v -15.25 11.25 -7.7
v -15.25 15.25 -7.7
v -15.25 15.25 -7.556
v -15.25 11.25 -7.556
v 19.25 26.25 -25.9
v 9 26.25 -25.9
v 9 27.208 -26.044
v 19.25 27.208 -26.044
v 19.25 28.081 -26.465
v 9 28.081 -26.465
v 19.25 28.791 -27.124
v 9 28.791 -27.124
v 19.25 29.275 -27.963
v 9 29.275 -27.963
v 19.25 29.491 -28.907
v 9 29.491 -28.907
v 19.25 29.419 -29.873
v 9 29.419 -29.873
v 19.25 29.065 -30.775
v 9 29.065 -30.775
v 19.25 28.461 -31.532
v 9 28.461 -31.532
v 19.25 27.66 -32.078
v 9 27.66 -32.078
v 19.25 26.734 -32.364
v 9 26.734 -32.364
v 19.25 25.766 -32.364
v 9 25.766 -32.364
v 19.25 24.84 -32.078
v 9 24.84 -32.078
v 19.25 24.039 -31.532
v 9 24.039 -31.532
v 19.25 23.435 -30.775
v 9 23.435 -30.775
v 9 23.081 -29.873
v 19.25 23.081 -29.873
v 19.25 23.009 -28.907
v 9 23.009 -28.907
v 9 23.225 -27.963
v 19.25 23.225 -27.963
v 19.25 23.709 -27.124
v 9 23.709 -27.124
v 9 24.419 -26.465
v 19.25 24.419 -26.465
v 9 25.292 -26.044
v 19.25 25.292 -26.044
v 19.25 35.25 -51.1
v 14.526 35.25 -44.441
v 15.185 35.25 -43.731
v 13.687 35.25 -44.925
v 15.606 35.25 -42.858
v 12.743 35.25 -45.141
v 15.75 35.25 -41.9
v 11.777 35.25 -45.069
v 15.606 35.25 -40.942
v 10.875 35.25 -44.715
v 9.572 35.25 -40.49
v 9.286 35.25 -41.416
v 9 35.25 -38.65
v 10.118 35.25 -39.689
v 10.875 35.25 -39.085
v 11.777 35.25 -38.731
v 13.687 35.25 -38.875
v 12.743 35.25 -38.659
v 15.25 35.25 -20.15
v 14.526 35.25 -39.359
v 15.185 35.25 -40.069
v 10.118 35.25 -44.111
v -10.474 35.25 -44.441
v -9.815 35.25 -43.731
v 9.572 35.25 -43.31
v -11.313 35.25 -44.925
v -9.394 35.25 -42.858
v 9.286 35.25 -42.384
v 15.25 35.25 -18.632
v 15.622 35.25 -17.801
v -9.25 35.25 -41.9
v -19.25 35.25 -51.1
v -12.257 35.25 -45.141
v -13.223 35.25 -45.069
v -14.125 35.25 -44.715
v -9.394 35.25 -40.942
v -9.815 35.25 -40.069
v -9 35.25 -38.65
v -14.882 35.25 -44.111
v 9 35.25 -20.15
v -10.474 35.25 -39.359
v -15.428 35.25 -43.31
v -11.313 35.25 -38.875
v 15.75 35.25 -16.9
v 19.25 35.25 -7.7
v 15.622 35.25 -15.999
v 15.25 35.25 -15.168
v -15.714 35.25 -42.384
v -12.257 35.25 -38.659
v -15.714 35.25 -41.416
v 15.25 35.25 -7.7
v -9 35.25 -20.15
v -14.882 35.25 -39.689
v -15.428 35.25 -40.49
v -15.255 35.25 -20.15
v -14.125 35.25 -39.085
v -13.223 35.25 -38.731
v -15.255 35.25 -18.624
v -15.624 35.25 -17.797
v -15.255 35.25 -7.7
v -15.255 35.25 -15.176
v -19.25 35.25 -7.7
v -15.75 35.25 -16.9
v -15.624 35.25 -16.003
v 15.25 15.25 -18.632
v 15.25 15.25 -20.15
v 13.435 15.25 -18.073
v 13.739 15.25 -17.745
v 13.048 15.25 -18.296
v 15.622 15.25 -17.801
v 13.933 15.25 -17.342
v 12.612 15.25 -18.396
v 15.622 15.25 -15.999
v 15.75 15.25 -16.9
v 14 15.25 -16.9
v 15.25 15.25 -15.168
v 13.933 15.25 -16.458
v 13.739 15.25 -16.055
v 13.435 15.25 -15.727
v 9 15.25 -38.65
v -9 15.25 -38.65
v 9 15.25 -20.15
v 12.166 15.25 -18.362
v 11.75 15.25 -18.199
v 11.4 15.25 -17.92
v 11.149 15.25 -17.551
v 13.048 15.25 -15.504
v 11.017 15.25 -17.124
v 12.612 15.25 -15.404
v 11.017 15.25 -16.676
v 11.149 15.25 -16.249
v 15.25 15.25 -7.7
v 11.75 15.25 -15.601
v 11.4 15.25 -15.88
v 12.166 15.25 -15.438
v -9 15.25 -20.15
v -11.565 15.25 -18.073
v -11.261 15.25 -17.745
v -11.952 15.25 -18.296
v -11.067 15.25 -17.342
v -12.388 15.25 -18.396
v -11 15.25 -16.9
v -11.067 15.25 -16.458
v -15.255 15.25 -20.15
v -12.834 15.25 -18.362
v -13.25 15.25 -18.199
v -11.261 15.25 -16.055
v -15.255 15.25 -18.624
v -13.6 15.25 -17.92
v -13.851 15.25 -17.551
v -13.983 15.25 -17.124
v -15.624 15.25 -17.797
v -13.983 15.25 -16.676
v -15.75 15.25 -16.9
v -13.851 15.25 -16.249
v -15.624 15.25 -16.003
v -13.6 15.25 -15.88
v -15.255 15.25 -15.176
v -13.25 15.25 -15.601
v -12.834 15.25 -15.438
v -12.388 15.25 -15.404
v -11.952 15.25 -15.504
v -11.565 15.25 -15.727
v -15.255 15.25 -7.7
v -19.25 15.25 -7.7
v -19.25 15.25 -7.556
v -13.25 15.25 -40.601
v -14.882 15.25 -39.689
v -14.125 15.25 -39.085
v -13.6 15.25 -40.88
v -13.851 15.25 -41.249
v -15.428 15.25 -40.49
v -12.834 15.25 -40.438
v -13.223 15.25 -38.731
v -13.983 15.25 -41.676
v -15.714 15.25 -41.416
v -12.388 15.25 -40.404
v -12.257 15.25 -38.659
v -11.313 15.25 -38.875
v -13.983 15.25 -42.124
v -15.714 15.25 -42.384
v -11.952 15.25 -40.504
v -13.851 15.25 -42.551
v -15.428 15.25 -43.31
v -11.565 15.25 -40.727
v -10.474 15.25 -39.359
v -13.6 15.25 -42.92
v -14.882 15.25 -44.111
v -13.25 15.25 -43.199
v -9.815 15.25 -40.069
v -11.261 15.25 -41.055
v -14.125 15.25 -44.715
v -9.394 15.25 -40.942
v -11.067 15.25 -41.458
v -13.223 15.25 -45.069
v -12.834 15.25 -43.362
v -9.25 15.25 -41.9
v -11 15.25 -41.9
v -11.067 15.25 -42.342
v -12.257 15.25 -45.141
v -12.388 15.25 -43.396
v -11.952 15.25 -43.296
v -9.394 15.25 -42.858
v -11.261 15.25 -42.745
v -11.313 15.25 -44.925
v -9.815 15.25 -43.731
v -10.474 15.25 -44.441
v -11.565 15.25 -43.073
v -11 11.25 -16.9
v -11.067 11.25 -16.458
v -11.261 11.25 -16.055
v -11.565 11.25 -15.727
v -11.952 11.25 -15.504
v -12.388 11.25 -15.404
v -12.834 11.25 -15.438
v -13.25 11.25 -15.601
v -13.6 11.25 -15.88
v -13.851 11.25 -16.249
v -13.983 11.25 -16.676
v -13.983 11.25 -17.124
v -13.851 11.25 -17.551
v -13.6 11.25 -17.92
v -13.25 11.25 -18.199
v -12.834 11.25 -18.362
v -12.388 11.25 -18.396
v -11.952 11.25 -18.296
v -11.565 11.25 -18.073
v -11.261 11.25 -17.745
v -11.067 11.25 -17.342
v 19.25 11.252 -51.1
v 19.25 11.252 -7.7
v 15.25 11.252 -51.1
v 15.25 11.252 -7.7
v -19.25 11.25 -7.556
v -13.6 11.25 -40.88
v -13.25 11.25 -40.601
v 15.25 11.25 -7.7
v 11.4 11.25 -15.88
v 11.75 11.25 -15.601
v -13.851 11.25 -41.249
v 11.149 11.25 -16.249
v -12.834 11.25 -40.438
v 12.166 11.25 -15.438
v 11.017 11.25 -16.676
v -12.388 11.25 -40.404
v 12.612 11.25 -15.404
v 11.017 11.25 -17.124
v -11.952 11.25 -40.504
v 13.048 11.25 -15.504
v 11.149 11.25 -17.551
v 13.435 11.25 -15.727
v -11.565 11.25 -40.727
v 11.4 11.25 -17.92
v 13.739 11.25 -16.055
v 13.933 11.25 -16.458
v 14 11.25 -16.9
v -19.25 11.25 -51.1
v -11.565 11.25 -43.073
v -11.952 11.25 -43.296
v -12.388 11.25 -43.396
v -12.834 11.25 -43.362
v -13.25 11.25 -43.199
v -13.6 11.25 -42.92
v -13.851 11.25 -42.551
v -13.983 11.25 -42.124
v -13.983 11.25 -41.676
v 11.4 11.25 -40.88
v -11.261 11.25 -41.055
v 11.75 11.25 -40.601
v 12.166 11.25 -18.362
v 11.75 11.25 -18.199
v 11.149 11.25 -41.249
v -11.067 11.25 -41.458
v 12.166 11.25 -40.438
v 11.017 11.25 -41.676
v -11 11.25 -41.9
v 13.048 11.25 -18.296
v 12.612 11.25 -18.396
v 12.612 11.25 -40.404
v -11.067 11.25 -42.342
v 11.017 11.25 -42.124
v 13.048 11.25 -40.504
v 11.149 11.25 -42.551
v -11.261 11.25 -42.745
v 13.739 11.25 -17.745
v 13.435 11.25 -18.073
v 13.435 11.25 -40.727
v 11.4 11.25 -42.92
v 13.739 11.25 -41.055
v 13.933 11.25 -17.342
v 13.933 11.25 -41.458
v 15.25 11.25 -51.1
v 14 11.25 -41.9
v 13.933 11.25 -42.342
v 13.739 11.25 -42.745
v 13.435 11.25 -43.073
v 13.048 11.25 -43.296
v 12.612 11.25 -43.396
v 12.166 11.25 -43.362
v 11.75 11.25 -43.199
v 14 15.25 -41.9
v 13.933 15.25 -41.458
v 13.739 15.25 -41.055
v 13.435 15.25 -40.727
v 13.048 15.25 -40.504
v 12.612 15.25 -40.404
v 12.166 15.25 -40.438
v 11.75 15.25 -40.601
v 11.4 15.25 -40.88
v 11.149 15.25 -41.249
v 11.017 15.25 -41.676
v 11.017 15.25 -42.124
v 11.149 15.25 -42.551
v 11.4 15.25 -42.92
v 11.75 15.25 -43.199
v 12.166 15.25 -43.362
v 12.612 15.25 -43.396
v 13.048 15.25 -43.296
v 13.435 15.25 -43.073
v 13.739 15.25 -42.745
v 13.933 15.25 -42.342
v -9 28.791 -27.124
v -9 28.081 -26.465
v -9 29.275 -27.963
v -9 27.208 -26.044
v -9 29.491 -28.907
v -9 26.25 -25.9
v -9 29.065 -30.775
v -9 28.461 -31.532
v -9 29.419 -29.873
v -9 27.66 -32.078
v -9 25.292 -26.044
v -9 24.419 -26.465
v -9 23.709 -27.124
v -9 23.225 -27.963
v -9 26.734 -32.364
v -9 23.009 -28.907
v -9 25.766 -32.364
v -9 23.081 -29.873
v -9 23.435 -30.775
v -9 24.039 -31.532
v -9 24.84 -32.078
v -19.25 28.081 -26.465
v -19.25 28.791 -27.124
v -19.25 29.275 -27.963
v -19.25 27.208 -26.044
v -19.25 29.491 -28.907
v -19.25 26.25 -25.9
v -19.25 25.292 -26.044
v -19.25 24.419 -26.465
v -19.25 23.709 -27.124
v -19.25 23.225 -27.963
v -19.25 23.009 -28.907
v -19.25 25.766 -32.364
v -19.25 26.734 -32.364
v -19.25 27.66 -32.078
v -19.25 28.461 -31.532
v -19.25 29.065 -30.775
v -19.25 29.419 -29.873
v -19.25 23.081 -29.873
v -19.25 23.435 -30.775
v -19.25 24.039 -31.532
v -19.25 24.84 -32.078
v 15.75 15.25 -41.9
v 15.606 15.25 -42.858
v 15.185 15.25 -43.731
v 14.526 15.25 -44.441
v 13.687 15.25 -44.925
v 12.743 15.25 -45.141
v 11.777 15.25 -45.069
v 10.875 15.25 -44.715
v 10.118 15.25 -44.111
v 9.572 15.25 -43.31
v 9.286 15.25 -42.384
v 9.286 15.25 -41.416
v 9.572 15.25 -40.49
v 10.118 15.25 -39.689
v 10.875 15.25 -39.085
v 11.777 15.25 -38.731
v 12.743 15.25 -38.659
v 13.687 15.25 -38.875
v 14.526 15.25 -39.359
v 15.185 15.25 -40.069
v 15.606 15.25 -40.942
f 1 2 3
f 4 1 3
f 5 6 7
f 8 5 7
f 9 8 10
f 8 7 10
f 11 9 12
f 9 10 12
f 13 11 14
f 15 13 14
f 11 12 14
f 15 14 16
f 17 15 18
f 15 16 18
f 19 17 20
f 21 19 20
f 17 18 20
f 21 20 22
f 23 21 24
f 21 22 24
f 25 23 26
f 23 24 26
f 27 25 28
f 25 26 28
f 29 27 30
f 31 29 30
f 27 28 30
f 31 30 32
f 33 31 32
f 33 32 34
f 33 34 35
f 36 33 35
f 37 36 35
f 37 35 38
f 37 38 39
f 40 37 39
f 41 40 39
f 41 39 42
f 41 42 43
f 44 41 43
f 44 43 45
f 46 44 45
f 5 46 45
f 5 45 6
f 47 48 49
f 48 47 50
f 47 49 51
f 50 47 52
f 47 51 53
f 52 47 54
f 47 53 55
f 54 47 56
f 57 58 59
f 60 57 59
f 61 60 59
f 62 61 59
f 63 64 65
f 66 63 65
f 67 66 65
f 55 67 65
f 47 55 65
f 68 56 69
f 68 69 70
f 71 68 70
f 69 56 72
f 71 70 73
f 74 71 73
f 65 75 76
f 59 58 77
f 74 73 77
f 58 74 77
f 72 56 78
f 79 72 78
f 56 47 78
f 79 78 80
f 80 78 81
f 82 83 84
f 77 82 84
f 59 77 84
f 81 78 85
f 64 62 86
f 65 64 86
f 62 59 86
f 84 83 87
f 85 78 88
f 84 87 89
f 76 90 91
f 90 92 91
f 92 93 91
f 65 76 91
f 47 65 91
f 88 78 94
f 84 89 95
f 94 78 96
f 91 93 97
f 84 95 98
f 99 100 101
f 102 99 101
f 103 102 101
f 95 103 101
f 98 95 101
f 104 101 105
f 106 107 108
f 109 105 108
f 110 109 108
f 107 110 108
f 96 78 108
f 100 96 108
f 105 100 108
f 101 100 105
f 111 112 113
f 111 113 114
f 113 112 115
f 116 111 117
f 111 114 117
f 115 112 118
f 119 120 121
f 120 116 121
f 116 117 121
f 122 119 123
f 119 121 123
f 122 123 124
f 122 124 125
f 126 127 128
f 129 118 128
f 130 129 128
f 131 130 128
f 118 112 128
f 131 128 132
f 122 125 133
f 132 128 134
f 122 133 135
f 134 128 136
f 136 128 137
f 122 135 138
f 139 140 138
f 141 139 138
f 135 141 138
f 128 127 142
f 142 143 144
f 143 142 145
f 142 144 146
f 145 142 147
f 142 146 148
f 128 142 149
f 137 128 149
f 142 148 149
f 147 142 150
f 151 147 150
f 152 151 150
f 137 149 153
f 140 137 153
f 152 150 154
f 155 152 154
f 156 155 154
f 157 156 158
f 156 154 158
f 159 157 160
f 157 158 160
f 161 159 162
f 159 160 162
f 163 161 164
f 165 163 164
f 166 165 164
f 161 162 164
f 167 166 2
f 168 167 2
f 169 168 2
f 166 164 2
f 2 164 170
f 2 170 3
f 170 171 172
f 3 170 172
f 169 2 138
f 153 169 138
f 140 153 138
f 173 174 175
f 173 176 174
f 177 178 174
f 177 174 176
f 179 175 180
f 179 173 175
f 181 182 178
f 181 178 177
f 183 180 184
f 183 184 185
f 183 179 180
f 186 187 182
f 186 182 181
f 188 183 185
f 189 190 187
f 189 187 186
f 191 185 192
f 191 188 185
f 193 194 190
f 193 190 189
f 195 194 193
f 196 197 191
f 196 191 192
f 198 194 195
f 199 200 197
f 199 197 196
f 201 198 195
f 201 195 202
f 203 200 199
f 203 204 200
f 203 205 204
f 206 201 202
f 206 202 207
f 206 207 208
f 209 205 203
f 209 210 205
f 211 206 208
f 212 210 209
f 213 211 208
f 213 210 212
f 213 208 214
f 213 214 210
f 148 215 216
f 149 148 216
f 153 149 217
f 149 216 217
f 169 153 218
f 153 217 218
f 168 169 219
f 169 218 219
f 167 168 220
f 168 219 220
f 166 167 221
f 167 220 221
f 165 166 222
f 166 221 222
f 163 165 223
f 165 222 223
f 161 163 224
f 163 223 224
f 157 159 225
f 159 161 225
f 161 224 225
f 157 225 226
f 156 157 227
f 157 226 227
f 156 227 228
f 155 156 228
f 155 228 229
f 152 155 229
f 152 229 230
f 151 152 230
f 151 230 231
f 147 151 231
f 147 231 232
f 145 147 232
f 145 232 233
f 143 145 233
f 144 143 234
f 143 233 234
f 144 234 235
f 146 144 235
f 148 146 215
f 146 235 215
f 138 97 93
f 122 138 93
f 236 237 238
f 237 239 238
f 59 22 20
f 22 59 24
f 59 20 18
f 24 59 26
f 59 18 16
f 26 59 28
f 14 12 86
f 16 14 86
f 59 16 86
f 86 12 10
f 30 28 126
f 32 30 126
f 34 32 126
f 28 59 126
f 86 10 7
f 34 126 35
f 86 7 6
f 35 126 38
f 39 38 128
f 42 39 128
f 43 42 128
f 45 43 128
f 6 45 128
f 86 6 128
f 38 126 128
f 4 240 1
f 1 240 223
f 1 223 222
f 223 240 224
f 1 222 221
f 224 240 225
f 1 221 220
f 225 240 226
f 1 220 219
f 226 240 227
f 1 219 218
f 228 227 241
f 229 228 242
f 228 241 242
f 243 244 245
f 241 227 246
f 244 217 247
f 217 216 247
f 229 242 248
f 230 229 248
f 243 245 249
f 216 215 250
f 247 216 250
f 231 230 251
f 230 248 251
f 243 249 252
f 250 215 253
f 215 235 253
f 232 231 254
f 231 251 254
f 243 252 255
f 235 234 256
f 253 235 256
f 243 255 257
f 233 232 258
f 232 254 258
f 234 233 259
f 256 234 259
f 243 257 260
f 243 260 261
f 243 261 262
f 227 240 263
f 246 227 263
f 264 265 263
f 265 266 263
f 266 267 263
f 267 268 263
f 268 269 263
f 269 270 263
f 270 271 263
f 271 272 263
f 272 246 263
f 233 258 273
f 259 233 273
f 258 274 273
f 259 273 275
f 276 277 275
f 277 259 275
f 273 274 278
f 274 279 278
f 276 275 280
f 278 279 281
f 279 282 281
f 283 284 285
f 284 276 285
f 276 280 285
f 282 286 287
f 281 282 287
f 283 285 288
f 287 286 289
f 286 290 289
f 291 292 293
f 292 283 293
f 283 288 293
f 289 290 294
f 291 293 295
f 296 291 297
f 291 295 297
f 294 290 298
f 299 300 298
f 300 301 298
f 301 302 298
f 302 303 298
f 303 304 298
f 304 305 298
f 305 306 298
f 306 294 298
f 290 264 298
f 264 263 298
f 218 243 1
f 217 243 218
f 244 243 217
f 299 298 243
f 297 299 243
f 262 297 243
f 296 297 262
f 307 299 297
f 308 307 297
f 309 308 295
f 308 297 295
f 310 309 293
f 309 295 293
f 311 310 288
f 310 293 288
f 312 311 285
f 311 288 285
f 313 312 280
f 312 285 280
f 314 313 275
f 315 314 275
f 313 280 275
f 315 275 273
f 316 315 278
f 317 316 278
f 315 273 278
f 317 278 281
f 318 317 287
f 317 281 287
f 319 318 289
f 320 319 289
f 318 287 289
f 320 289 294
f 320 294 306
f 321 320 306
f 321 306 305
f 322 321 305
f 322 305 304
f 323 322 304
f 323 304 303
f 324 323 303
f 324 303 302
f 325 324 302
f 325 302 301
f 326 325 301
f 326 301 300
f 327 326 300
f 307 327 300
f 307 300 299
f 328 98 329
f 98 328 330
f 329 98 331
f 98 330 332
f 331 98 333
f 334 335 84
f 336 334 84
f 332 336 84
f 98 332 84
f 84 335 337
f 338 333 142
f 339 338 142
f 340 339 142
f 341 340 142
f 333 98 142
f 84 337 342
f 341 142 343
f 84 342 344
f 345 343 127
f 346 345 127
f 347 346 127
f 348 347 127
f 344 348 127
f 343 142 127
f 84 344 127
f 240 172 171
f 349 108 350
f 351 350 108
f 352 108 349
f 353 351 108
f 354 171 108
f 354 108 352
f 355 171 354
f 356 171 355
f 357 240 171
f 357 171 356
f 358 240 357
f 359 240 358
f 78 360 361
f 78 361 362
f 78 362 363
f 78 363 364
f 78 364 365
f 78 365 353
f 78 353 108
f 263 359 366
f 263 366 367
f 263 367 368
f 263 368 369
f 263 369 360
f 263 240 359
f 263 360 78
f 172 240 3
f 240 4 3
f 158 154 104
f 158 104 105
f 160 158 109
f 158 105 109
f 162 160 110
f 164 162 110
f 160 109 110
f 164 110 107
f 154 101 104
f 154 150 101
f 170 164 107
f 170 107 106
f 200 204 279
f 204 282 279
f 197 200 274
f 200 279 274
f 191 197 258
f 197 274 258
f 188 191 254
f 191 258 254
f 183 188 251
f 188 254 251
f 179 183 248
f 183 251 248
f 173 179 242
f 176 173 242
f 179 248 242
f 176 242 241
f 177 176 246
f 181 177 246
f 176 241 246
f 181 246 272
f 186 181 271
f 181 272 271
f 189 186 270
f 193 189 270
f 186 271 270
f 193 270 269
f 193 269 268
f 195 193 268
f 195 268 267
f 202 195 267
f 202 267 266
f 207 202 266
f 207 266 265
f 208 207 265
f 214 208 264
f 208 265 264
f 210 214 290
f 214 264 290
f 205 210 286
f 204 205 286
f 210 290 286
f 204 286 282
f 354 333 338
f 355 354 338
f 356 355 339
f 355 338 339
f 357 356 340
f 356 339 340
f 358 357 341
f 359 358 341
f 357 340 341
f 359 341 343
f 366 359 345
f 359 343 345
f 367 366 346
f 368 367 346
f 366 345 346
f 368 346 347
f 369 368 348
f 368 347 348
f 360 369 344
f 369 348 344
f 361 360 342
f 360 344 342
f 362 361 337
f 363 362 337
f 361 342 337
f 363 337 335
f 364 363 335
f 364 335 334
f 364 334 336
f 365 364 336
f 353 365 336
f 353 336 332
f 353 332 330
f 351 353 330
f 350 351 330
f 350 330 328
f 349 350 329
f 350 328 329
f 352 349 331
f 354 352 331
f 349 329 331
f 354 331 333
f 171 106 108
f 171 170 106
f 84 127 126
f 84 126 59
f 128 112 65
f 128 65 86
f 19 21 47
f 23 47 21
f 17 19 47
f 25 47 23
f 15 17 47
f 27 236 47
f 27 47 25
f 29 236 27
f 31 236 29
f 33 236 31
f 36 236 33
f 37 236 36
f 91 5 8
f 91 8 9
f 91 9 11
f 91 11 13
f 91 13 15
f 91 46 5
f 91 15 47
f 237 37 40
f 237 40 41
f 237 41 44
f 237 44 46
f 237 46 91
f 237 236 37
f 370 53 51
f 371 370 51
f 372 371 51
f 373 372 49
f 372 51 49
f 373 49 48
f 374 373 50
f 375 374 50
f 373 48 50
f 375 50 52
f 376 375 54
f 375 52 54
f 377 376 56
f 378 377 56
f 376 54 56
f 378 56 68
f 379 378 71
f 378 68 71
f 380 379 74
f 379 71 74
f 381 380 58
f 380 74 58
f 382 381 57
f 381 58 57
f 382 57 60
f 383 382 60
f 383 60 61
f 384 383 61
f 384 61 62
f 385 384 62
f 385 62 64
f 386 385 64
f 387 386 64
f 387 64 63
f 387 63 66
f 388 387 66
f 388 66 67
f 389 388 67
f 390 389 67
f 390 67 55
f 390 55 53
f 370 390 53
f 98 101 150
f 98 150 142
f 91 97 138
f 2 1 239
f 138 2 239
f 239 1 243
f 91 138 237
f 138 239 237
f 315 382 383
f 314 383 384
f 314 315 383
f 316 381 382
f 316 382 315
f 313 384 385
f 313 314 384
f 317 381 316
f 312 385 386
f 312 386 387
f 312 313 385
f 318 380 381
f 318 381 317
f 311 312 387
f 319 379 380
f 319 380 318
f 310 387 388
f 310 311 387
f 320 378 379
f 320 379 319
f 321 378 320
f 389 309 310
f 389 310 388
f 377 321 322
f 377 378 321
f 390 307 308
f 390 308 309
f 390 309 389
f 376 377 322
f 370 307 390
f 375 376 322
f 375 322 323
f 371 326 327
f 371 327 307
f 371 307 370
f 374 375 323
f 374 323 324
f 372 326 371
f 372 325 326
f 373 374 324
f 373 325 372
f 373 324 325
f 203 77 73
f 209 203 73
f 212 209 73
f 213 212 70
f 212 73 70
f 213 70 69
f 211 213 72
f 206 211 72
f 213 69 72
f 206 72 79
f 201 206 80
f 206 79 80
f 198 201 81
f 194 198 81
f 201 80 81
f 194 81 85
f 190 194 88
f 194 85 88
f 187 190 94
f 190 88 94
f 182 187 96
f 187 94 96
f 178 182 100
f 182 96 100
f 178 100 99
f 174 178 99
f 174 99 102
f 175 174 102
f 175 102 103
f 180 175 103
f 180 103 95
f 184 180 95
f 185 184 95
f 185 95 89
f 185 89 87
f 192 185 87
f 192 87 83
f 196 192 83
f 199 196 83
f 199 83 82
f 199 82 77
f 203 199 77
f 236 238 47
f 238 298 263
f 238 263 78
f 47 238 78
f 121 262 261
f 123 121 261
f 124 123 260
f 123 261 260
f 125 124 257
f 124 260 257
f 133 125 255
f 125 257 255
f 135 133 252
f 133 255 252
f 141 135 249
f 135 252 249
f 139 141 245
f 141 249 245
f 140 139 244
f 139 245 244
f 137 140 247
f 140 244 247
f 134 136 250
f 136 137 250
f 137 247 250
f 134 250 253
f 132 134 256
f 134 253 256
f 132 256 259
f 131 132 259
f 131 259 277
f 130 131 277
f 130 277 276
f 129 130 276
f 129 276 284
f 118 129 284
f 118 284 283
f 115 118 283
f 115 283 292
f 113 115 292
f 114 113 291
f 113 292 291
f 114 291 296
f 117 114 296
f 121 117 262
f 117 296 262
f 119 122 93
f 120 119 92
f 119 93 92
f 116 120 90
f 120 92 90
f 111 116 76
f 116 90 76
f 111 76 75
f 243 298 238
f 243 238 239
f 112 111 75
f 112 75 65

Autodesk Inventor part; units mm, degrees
ref_plane "Work Plane1" through (-15.25, 11.25, -51.1) normal (0, 1, 0) x (1, 0, 0)
sketch "Sketch1" plane through (-15.25, 11.25, -51.1) normal (0, 1, 0) x (1, 0, 0)
  line L0 (0, 0) -> (-1, 0) projected
  line L1 (30.5, 0) -> (30.5, -43.4) projected
  line L2 (0, 0) -> (30.5, 0)
  line L3 (30.5, 0) -> (30.5, -43.4)
  line L4 (30.5, -43.4) -> (0, -43.4)
  line L5 (0, -43.4) -> (0, 0)
  circle A0 centre (2.75, -9.2) radius 1.5 projected
  circle A1 centre (2.75, -9.2) radius 1.5
  circle A2 centre (2.75, -34.2) radius 1.5 projected
  circle A3 centre (2.75, -34.2) radius 1.5
  circle A4 centre (27.75, -34.2) radius 1.5 projected
  circle A5 centre (27.75, -34.2) radius 1.5
  circle A6 centre (27.75, -9.2) radius 1.5 projected
  circle A7 centre (27.75, -9.2) radius 1.5
  point P0 (15.25, -51.1)
extrude "Extrusion1" add sketch "Sketch1" along normal blind 4
ref_plane "Work Plane2" through (-15.25, 11.25, -7.7) normal (-1, 0, 0) x (0, 0, 1)
sketch "Sketch2" plane through (-15.25, 11.25, -7.7) normal (-1, 0, 0) x (0, 0, 1)
  line L0 (-43.4, 0) -> (-43.4, 4) projected
  line L1 (-43.4, 0) -> (0.1445, 0)
  line L2 (0.1445, 0) -> (0.1445, 4)
  line L3 (0.1445, 4) -> (-43.4, 4)
  line L4 (-43.4, 4) -> (-43.4, 0)
  point P0 (7.7, -11.25)
extrude "Extrusion2" add sketch "Sketch2" along normal blind 4
ref_plane "Work Plane3" through (15.25, 11.25, -51.1) normal (1, 0, 0) x (0, 0, -1)
sketch "Sketch3" plane through (15.25, 11.25, -51.1) normal (1, 0, 0) x (0, 0, -1)
  line L0 (0, 0) -> (0, 4) projected
  line L1 (0, 4) -> (-43.4, 4)
  line L2 (-43.4, 4) -> (-43.4, 0.0024)
  line L3 (-43.4, 0.0024) -> (0, 0.0024)
  line L4 (0, 0.0024) -> (0, 4)
  point P0 (-51.1, -11.25)
extrude "Extrusion3" add sketch "Sketch3" along normal blind 4
ref_plane "Work Plane6" through (-15.25, 15.25, -51.1) normal (0, 1, 0) x (1, 0, 0)
sketch "Sketch4" plane through (-15.25, 15.25, -51.1) normal (0, 1, 0) x (1, 0, 0)
  line L0 (-0.75, -43.4) -> (0.25, -43.4) projected
  line L1 (-0.0048, -43.4) -> (-4, -43.4)
  line L2 (-4, -43.4) -> (-4, 0)
  line L3 (-4, 0) -> (-0.0048, 0)
  line L4 (-0.0048, 0) -> (-0.0048, -43.4)
  point P0 (15.25, -51.1)
extrude "Extrusion4" add sketch "Sketch4" along normal blind 15
ref_plane "Work Plane5" through (-15.25, 15.25, -51.1) normal (0, 1, 0) x (1, 0, 0)
sketch "Sketch5" plane through (-15.25, 15.25, -51.1) normal (0, 1, 0) x (1, 0, 0)
  line L0 (30.5, 0) -> (34.5, 0) projected
  line L1 (30.5, -43.4) -> (30.5, 0) projected
  line L2 (34.5, 0) -> (30.5, 0)
  line L3 (30.5, 0) -> (30.5, -43.4)
  line L4 (30.5, -43.4) -> (34.5, -43.4)
  line L5 (34.5, -43.4) -> (34.5, 0)
  point P0 (15.25, -51.1)
extrude "Extrusion5" add sketch "Sketch5" along normal blind 15
ref_plane "Work Plane4" through (-15.25, 15.25, -51.1) normal (0, 1, 0) x (1, 0, 0)
sketch "Sketch6" plane through (-15.25, 15.25, -51.1) normal (0, 1, 0) x (1, 0, 0)
  circle A0 centre (2.75, -34.2) radius 2 projected
  circle A1 centre (2.75, -34.2) radius 3.25
  circle A2 centre (27.75, -34.2) radius 1.5 projected
  circle A3 centre (27.75, -34.2) radius 3.25
  circle A4 centre (27.75, -9.2) radius 1.5 projected
  circle A5 centre (27.75, -9.2) radius 3.25
  circle A6 centre (2.75, -9.2) radius 1.5 projected
  circle A7 centre (2.75, -9.2) radius 3.25
  line L0 (15.25, -21.7) -> (24.25, -21.7)
  line L1 (15.25, -21.7) -> (6.25, -21.7)
  line L2 (30.5, 0) -> (30.5, -43.4) projected
  line L3 (24.25, -21.7) -> (30.5, -21.7)
  line L4 (30.5, -21.7) -> (30.5, -12.45)
  line L5 (30.5, -12.45) -> (24.25, -12.45)
  line L6 (24.25, -12.45) -> (24.25, -21.7)
  line L7 (24.25, -21.7) -> (30.5, -21.7)
  line L8 (30.5, -21.7) -> (30.5, -30.95)
  line L9 (30.5, -30.95) -> (24.25, -30.95)
  line L10 (24.25, -30.95) -> (24.25, -21.7)
  line L11 (-0.0048, 0) -> (-0.0048, -43.4) projected
  line L12 (6.25, -21.7) -> (-0.0048, -21.7)
  line L13 (-0.0048, -21.7) -> (-0.0048, -30.95)
  line L14 (-0.0048, -30.95) -> (6.25, -30.95)
  line L15 (6.25, -30.95) -> (6.25, -21.7)
  line L16 (6.25, -21.7) -> (-0.0048, -21.7)
  line L17 (-0.0048, -21.7) -> (-0.0048, -12.45)
  line L18 (-0.0048, -12.45) -> (6.25, -12.45)
  line L19 (6.25, -12.45) -> (6.25, -21.7)
  point P0 (15.25, -51.1)
  dimension "d11" = 6.5
  dimension "d12" = 6.5
  dimension "d13" = 6.5
  dimension "d14" = 6.5
  dimension "d15" = 9
  dimension "d16" = 9
extrude "Extrusion6" add sketch "Sketch6" along normal blind 15 contours L6 L5 L2 L3 | L3 L2 L9 L10 | L14 L11 L12 L15 | L11 L18 L19 L12
ref_plane "Work Plane8" through (-15.25, 30.25, -51.1) normal (0, 1, 0) x (1, 0, 0)
sketch "Sketch7" plane through (-15.25, 30.25, -51.1) normal (0, 1, 0) x (1, 0, 0)
  line L0 (0, -43.4) -> (0, -43.5445) projected
  line L1 (-4, -43.4) -> (-0.0048, -43.4) projected
  line L2 (0, -43.4) -> (-4, -43.4)
  line L3 (-0.0048, 0) -> (-4, 0) projected
  line L4 (-4, -43.4) -> (-4, 0)
  line L5 (-4, 0) -> (-0.0048, 0)
  line L6 (-0.0048, -12.45) -> (-0.0048, 0) projected
  line L7 (-0.0048, 0) -> (-0.0048, -12.45)
  line L8 (6.25, -30.95) -> (6.25, -12.45) projected
  line L9 (-0.0048, -12.45) -> (6.25, -12.45)
  line L10 (6.25, -12.45) -> (6.25, -30.95)
  line L11 (-0.0048, -30.95) -> (-0.0048, -43.4) projected
  line L12 (6.25, -30.95) -> (-0.0048, -30.95)
  line L13 (-0.0048, -30.95) -> (-0.0048, -43.4)
  line L14 (24.25, -12.45) -> (24.25, -30.95) projected
  line L15 (24.25, -30.95) -> (24.25, -12.45)
  line L16 (30.5, -12.45) -> (24.25, -12.45) projected
  line L17 (24.25, -12.45) -> (30.5, -12.45)
  line L18 (30.5, -12.45) -> (30.5, 0)
  line L19 (30.5, 0) -> (34.4541, 0)
  line L20 (34.4541, 0) -> (34.4541, -43.4)
  line L21 (34.4541, -43.4) -> (30.5, -43.4)
  line L22 (30.5, -43.4) -> (30.5, -30.95)
  line L23 (30.5, -30.95) -> (24.25, -30.95)
  point P0 (15.25, -51.1)
extrude "Extrusion7" add sketch "Sketch7" along normal blind 5
ref_plane "Work Plane7" through (-15.25, 30.25, -51.1) normal (0, 1, 0) x (1, 0, 0)
sketch "Sketch8" plane through (-15.25, 30.25, -51.1) normal (0, 1, 0) x (1, 0, 0)
  line L0 (30.5, -43.4) -> (34.5, -43.4) projected
  line L1 (34.4541, 0) -> (34.4541, -43.4) projected
  line L2 (34.5, -43.4) -> (34.4541, -43.4)
  line L3 (34.4541, -43.4) -> (34.4541, 0)
  line L4 (34.4541, 0) -> (34.5, 0)
  line L5 (34.5, 0) -> (34.5, -43.4)
  point P0 (15.25, -51.1)
extrude "Extrusion8" add sketch "Sketch8" along normal blind 5
ref_plane "Work Plane9" through (-15.2548, 15.25, -38.65) normal (1, 0, 0) x (0, 0, -1)
sketch "Sketch9" plane through (-15.2548, 15.25, -38.65) normal (1, 0, 0) x (0, 0, -1)
  line L0 (0, 0) -> (0, 20) projected
  line L1 (12.45, 20) -> (0, 20) projected
  line L2 (0, 0) -> (12.45, 0)
  line L3 (12.45, 0) -> (12.45, 20)
  line L4 (12.45, 20) -> (0, 20)
  line L5 (0, 20) -> (0, 0)
  point P0 (-38.65, -15.25)
extrude "Extrusion9" add sketch "Sketch9" along normal up to surface (30.5048 mm away)
sketch "Sketch10" plane through (-15.25, 11.25, -51.1) normal (0, -1, 0) x (1, 0, 0)
  circle A0 centre (27.75, 9.2) radius 1.5 projected
  circle A1 centre (27.75, 9.2) radius 1.5
  circle A2 centre (2.75, 9.2) radius 1.5 projected
  circle A3 centre (2.75, 9.2) radius 1.5
  point P0 (15.25, 51.1)
extrude "Extrusion10" cut sketch "Sketch10" against normal through all
sketch "Sketch11" plane through (-15.25, 35.25, -51.1) normal (0, 1, 0) x (1, 0, 0)
  circle A0 centre (2.75, -9.2) radius 1.5 projected
  circle A1 centre (2.75, -9.2) radius 3.25
  circle A2 centre (27.75, -9.2) radius 1.5 projected
  circle A3 centre (27.75, -9.2) radius 3.25
  circle A4 centre (2.75, -34.2) radius 1.5 projected
  circle A5 centre (2.75, -34.2) radius 3.25
  circle A6 centre (27.75, -34.2) radius 1.5 projected
  circle A7 centre (27.75, -34.2) radius 3.25
  point P0 (15.25, -51.1)
  dimension "d27" = 6.5
  dimension "d28" = 6.5
  dimension "d29" = 6.5
  dimension "d30" = 6.5
extrude "Extrusion11" cut sketch "Sketch11" against normal up to surface (20 mm away) contours A0 | A1 | A2 | A3 | A4 | A5 | A6 | A7
sketch "Sketch12" plane through (9, 15.25, -20.15) normal (-1, 0, 0) x (0, 0, 1)
  line L0 (0, 20) -> (0, 0) projected
  line L1 (0, 20) -> (0, 11)
  line L2 (0, 11) -> (-9, 11)
  circle A0 centre (-9, 11) radius 3.25
  point P0 (20.15, -15.25)
  dimension "d33" = 9
  dimension "d34" = 9
  dimension "d35" = 6.5
extrude "Extrusion12" cut sketch "Sketch12" along normal mid plane 70
properties part number "linrail_mov_holder_ax"
